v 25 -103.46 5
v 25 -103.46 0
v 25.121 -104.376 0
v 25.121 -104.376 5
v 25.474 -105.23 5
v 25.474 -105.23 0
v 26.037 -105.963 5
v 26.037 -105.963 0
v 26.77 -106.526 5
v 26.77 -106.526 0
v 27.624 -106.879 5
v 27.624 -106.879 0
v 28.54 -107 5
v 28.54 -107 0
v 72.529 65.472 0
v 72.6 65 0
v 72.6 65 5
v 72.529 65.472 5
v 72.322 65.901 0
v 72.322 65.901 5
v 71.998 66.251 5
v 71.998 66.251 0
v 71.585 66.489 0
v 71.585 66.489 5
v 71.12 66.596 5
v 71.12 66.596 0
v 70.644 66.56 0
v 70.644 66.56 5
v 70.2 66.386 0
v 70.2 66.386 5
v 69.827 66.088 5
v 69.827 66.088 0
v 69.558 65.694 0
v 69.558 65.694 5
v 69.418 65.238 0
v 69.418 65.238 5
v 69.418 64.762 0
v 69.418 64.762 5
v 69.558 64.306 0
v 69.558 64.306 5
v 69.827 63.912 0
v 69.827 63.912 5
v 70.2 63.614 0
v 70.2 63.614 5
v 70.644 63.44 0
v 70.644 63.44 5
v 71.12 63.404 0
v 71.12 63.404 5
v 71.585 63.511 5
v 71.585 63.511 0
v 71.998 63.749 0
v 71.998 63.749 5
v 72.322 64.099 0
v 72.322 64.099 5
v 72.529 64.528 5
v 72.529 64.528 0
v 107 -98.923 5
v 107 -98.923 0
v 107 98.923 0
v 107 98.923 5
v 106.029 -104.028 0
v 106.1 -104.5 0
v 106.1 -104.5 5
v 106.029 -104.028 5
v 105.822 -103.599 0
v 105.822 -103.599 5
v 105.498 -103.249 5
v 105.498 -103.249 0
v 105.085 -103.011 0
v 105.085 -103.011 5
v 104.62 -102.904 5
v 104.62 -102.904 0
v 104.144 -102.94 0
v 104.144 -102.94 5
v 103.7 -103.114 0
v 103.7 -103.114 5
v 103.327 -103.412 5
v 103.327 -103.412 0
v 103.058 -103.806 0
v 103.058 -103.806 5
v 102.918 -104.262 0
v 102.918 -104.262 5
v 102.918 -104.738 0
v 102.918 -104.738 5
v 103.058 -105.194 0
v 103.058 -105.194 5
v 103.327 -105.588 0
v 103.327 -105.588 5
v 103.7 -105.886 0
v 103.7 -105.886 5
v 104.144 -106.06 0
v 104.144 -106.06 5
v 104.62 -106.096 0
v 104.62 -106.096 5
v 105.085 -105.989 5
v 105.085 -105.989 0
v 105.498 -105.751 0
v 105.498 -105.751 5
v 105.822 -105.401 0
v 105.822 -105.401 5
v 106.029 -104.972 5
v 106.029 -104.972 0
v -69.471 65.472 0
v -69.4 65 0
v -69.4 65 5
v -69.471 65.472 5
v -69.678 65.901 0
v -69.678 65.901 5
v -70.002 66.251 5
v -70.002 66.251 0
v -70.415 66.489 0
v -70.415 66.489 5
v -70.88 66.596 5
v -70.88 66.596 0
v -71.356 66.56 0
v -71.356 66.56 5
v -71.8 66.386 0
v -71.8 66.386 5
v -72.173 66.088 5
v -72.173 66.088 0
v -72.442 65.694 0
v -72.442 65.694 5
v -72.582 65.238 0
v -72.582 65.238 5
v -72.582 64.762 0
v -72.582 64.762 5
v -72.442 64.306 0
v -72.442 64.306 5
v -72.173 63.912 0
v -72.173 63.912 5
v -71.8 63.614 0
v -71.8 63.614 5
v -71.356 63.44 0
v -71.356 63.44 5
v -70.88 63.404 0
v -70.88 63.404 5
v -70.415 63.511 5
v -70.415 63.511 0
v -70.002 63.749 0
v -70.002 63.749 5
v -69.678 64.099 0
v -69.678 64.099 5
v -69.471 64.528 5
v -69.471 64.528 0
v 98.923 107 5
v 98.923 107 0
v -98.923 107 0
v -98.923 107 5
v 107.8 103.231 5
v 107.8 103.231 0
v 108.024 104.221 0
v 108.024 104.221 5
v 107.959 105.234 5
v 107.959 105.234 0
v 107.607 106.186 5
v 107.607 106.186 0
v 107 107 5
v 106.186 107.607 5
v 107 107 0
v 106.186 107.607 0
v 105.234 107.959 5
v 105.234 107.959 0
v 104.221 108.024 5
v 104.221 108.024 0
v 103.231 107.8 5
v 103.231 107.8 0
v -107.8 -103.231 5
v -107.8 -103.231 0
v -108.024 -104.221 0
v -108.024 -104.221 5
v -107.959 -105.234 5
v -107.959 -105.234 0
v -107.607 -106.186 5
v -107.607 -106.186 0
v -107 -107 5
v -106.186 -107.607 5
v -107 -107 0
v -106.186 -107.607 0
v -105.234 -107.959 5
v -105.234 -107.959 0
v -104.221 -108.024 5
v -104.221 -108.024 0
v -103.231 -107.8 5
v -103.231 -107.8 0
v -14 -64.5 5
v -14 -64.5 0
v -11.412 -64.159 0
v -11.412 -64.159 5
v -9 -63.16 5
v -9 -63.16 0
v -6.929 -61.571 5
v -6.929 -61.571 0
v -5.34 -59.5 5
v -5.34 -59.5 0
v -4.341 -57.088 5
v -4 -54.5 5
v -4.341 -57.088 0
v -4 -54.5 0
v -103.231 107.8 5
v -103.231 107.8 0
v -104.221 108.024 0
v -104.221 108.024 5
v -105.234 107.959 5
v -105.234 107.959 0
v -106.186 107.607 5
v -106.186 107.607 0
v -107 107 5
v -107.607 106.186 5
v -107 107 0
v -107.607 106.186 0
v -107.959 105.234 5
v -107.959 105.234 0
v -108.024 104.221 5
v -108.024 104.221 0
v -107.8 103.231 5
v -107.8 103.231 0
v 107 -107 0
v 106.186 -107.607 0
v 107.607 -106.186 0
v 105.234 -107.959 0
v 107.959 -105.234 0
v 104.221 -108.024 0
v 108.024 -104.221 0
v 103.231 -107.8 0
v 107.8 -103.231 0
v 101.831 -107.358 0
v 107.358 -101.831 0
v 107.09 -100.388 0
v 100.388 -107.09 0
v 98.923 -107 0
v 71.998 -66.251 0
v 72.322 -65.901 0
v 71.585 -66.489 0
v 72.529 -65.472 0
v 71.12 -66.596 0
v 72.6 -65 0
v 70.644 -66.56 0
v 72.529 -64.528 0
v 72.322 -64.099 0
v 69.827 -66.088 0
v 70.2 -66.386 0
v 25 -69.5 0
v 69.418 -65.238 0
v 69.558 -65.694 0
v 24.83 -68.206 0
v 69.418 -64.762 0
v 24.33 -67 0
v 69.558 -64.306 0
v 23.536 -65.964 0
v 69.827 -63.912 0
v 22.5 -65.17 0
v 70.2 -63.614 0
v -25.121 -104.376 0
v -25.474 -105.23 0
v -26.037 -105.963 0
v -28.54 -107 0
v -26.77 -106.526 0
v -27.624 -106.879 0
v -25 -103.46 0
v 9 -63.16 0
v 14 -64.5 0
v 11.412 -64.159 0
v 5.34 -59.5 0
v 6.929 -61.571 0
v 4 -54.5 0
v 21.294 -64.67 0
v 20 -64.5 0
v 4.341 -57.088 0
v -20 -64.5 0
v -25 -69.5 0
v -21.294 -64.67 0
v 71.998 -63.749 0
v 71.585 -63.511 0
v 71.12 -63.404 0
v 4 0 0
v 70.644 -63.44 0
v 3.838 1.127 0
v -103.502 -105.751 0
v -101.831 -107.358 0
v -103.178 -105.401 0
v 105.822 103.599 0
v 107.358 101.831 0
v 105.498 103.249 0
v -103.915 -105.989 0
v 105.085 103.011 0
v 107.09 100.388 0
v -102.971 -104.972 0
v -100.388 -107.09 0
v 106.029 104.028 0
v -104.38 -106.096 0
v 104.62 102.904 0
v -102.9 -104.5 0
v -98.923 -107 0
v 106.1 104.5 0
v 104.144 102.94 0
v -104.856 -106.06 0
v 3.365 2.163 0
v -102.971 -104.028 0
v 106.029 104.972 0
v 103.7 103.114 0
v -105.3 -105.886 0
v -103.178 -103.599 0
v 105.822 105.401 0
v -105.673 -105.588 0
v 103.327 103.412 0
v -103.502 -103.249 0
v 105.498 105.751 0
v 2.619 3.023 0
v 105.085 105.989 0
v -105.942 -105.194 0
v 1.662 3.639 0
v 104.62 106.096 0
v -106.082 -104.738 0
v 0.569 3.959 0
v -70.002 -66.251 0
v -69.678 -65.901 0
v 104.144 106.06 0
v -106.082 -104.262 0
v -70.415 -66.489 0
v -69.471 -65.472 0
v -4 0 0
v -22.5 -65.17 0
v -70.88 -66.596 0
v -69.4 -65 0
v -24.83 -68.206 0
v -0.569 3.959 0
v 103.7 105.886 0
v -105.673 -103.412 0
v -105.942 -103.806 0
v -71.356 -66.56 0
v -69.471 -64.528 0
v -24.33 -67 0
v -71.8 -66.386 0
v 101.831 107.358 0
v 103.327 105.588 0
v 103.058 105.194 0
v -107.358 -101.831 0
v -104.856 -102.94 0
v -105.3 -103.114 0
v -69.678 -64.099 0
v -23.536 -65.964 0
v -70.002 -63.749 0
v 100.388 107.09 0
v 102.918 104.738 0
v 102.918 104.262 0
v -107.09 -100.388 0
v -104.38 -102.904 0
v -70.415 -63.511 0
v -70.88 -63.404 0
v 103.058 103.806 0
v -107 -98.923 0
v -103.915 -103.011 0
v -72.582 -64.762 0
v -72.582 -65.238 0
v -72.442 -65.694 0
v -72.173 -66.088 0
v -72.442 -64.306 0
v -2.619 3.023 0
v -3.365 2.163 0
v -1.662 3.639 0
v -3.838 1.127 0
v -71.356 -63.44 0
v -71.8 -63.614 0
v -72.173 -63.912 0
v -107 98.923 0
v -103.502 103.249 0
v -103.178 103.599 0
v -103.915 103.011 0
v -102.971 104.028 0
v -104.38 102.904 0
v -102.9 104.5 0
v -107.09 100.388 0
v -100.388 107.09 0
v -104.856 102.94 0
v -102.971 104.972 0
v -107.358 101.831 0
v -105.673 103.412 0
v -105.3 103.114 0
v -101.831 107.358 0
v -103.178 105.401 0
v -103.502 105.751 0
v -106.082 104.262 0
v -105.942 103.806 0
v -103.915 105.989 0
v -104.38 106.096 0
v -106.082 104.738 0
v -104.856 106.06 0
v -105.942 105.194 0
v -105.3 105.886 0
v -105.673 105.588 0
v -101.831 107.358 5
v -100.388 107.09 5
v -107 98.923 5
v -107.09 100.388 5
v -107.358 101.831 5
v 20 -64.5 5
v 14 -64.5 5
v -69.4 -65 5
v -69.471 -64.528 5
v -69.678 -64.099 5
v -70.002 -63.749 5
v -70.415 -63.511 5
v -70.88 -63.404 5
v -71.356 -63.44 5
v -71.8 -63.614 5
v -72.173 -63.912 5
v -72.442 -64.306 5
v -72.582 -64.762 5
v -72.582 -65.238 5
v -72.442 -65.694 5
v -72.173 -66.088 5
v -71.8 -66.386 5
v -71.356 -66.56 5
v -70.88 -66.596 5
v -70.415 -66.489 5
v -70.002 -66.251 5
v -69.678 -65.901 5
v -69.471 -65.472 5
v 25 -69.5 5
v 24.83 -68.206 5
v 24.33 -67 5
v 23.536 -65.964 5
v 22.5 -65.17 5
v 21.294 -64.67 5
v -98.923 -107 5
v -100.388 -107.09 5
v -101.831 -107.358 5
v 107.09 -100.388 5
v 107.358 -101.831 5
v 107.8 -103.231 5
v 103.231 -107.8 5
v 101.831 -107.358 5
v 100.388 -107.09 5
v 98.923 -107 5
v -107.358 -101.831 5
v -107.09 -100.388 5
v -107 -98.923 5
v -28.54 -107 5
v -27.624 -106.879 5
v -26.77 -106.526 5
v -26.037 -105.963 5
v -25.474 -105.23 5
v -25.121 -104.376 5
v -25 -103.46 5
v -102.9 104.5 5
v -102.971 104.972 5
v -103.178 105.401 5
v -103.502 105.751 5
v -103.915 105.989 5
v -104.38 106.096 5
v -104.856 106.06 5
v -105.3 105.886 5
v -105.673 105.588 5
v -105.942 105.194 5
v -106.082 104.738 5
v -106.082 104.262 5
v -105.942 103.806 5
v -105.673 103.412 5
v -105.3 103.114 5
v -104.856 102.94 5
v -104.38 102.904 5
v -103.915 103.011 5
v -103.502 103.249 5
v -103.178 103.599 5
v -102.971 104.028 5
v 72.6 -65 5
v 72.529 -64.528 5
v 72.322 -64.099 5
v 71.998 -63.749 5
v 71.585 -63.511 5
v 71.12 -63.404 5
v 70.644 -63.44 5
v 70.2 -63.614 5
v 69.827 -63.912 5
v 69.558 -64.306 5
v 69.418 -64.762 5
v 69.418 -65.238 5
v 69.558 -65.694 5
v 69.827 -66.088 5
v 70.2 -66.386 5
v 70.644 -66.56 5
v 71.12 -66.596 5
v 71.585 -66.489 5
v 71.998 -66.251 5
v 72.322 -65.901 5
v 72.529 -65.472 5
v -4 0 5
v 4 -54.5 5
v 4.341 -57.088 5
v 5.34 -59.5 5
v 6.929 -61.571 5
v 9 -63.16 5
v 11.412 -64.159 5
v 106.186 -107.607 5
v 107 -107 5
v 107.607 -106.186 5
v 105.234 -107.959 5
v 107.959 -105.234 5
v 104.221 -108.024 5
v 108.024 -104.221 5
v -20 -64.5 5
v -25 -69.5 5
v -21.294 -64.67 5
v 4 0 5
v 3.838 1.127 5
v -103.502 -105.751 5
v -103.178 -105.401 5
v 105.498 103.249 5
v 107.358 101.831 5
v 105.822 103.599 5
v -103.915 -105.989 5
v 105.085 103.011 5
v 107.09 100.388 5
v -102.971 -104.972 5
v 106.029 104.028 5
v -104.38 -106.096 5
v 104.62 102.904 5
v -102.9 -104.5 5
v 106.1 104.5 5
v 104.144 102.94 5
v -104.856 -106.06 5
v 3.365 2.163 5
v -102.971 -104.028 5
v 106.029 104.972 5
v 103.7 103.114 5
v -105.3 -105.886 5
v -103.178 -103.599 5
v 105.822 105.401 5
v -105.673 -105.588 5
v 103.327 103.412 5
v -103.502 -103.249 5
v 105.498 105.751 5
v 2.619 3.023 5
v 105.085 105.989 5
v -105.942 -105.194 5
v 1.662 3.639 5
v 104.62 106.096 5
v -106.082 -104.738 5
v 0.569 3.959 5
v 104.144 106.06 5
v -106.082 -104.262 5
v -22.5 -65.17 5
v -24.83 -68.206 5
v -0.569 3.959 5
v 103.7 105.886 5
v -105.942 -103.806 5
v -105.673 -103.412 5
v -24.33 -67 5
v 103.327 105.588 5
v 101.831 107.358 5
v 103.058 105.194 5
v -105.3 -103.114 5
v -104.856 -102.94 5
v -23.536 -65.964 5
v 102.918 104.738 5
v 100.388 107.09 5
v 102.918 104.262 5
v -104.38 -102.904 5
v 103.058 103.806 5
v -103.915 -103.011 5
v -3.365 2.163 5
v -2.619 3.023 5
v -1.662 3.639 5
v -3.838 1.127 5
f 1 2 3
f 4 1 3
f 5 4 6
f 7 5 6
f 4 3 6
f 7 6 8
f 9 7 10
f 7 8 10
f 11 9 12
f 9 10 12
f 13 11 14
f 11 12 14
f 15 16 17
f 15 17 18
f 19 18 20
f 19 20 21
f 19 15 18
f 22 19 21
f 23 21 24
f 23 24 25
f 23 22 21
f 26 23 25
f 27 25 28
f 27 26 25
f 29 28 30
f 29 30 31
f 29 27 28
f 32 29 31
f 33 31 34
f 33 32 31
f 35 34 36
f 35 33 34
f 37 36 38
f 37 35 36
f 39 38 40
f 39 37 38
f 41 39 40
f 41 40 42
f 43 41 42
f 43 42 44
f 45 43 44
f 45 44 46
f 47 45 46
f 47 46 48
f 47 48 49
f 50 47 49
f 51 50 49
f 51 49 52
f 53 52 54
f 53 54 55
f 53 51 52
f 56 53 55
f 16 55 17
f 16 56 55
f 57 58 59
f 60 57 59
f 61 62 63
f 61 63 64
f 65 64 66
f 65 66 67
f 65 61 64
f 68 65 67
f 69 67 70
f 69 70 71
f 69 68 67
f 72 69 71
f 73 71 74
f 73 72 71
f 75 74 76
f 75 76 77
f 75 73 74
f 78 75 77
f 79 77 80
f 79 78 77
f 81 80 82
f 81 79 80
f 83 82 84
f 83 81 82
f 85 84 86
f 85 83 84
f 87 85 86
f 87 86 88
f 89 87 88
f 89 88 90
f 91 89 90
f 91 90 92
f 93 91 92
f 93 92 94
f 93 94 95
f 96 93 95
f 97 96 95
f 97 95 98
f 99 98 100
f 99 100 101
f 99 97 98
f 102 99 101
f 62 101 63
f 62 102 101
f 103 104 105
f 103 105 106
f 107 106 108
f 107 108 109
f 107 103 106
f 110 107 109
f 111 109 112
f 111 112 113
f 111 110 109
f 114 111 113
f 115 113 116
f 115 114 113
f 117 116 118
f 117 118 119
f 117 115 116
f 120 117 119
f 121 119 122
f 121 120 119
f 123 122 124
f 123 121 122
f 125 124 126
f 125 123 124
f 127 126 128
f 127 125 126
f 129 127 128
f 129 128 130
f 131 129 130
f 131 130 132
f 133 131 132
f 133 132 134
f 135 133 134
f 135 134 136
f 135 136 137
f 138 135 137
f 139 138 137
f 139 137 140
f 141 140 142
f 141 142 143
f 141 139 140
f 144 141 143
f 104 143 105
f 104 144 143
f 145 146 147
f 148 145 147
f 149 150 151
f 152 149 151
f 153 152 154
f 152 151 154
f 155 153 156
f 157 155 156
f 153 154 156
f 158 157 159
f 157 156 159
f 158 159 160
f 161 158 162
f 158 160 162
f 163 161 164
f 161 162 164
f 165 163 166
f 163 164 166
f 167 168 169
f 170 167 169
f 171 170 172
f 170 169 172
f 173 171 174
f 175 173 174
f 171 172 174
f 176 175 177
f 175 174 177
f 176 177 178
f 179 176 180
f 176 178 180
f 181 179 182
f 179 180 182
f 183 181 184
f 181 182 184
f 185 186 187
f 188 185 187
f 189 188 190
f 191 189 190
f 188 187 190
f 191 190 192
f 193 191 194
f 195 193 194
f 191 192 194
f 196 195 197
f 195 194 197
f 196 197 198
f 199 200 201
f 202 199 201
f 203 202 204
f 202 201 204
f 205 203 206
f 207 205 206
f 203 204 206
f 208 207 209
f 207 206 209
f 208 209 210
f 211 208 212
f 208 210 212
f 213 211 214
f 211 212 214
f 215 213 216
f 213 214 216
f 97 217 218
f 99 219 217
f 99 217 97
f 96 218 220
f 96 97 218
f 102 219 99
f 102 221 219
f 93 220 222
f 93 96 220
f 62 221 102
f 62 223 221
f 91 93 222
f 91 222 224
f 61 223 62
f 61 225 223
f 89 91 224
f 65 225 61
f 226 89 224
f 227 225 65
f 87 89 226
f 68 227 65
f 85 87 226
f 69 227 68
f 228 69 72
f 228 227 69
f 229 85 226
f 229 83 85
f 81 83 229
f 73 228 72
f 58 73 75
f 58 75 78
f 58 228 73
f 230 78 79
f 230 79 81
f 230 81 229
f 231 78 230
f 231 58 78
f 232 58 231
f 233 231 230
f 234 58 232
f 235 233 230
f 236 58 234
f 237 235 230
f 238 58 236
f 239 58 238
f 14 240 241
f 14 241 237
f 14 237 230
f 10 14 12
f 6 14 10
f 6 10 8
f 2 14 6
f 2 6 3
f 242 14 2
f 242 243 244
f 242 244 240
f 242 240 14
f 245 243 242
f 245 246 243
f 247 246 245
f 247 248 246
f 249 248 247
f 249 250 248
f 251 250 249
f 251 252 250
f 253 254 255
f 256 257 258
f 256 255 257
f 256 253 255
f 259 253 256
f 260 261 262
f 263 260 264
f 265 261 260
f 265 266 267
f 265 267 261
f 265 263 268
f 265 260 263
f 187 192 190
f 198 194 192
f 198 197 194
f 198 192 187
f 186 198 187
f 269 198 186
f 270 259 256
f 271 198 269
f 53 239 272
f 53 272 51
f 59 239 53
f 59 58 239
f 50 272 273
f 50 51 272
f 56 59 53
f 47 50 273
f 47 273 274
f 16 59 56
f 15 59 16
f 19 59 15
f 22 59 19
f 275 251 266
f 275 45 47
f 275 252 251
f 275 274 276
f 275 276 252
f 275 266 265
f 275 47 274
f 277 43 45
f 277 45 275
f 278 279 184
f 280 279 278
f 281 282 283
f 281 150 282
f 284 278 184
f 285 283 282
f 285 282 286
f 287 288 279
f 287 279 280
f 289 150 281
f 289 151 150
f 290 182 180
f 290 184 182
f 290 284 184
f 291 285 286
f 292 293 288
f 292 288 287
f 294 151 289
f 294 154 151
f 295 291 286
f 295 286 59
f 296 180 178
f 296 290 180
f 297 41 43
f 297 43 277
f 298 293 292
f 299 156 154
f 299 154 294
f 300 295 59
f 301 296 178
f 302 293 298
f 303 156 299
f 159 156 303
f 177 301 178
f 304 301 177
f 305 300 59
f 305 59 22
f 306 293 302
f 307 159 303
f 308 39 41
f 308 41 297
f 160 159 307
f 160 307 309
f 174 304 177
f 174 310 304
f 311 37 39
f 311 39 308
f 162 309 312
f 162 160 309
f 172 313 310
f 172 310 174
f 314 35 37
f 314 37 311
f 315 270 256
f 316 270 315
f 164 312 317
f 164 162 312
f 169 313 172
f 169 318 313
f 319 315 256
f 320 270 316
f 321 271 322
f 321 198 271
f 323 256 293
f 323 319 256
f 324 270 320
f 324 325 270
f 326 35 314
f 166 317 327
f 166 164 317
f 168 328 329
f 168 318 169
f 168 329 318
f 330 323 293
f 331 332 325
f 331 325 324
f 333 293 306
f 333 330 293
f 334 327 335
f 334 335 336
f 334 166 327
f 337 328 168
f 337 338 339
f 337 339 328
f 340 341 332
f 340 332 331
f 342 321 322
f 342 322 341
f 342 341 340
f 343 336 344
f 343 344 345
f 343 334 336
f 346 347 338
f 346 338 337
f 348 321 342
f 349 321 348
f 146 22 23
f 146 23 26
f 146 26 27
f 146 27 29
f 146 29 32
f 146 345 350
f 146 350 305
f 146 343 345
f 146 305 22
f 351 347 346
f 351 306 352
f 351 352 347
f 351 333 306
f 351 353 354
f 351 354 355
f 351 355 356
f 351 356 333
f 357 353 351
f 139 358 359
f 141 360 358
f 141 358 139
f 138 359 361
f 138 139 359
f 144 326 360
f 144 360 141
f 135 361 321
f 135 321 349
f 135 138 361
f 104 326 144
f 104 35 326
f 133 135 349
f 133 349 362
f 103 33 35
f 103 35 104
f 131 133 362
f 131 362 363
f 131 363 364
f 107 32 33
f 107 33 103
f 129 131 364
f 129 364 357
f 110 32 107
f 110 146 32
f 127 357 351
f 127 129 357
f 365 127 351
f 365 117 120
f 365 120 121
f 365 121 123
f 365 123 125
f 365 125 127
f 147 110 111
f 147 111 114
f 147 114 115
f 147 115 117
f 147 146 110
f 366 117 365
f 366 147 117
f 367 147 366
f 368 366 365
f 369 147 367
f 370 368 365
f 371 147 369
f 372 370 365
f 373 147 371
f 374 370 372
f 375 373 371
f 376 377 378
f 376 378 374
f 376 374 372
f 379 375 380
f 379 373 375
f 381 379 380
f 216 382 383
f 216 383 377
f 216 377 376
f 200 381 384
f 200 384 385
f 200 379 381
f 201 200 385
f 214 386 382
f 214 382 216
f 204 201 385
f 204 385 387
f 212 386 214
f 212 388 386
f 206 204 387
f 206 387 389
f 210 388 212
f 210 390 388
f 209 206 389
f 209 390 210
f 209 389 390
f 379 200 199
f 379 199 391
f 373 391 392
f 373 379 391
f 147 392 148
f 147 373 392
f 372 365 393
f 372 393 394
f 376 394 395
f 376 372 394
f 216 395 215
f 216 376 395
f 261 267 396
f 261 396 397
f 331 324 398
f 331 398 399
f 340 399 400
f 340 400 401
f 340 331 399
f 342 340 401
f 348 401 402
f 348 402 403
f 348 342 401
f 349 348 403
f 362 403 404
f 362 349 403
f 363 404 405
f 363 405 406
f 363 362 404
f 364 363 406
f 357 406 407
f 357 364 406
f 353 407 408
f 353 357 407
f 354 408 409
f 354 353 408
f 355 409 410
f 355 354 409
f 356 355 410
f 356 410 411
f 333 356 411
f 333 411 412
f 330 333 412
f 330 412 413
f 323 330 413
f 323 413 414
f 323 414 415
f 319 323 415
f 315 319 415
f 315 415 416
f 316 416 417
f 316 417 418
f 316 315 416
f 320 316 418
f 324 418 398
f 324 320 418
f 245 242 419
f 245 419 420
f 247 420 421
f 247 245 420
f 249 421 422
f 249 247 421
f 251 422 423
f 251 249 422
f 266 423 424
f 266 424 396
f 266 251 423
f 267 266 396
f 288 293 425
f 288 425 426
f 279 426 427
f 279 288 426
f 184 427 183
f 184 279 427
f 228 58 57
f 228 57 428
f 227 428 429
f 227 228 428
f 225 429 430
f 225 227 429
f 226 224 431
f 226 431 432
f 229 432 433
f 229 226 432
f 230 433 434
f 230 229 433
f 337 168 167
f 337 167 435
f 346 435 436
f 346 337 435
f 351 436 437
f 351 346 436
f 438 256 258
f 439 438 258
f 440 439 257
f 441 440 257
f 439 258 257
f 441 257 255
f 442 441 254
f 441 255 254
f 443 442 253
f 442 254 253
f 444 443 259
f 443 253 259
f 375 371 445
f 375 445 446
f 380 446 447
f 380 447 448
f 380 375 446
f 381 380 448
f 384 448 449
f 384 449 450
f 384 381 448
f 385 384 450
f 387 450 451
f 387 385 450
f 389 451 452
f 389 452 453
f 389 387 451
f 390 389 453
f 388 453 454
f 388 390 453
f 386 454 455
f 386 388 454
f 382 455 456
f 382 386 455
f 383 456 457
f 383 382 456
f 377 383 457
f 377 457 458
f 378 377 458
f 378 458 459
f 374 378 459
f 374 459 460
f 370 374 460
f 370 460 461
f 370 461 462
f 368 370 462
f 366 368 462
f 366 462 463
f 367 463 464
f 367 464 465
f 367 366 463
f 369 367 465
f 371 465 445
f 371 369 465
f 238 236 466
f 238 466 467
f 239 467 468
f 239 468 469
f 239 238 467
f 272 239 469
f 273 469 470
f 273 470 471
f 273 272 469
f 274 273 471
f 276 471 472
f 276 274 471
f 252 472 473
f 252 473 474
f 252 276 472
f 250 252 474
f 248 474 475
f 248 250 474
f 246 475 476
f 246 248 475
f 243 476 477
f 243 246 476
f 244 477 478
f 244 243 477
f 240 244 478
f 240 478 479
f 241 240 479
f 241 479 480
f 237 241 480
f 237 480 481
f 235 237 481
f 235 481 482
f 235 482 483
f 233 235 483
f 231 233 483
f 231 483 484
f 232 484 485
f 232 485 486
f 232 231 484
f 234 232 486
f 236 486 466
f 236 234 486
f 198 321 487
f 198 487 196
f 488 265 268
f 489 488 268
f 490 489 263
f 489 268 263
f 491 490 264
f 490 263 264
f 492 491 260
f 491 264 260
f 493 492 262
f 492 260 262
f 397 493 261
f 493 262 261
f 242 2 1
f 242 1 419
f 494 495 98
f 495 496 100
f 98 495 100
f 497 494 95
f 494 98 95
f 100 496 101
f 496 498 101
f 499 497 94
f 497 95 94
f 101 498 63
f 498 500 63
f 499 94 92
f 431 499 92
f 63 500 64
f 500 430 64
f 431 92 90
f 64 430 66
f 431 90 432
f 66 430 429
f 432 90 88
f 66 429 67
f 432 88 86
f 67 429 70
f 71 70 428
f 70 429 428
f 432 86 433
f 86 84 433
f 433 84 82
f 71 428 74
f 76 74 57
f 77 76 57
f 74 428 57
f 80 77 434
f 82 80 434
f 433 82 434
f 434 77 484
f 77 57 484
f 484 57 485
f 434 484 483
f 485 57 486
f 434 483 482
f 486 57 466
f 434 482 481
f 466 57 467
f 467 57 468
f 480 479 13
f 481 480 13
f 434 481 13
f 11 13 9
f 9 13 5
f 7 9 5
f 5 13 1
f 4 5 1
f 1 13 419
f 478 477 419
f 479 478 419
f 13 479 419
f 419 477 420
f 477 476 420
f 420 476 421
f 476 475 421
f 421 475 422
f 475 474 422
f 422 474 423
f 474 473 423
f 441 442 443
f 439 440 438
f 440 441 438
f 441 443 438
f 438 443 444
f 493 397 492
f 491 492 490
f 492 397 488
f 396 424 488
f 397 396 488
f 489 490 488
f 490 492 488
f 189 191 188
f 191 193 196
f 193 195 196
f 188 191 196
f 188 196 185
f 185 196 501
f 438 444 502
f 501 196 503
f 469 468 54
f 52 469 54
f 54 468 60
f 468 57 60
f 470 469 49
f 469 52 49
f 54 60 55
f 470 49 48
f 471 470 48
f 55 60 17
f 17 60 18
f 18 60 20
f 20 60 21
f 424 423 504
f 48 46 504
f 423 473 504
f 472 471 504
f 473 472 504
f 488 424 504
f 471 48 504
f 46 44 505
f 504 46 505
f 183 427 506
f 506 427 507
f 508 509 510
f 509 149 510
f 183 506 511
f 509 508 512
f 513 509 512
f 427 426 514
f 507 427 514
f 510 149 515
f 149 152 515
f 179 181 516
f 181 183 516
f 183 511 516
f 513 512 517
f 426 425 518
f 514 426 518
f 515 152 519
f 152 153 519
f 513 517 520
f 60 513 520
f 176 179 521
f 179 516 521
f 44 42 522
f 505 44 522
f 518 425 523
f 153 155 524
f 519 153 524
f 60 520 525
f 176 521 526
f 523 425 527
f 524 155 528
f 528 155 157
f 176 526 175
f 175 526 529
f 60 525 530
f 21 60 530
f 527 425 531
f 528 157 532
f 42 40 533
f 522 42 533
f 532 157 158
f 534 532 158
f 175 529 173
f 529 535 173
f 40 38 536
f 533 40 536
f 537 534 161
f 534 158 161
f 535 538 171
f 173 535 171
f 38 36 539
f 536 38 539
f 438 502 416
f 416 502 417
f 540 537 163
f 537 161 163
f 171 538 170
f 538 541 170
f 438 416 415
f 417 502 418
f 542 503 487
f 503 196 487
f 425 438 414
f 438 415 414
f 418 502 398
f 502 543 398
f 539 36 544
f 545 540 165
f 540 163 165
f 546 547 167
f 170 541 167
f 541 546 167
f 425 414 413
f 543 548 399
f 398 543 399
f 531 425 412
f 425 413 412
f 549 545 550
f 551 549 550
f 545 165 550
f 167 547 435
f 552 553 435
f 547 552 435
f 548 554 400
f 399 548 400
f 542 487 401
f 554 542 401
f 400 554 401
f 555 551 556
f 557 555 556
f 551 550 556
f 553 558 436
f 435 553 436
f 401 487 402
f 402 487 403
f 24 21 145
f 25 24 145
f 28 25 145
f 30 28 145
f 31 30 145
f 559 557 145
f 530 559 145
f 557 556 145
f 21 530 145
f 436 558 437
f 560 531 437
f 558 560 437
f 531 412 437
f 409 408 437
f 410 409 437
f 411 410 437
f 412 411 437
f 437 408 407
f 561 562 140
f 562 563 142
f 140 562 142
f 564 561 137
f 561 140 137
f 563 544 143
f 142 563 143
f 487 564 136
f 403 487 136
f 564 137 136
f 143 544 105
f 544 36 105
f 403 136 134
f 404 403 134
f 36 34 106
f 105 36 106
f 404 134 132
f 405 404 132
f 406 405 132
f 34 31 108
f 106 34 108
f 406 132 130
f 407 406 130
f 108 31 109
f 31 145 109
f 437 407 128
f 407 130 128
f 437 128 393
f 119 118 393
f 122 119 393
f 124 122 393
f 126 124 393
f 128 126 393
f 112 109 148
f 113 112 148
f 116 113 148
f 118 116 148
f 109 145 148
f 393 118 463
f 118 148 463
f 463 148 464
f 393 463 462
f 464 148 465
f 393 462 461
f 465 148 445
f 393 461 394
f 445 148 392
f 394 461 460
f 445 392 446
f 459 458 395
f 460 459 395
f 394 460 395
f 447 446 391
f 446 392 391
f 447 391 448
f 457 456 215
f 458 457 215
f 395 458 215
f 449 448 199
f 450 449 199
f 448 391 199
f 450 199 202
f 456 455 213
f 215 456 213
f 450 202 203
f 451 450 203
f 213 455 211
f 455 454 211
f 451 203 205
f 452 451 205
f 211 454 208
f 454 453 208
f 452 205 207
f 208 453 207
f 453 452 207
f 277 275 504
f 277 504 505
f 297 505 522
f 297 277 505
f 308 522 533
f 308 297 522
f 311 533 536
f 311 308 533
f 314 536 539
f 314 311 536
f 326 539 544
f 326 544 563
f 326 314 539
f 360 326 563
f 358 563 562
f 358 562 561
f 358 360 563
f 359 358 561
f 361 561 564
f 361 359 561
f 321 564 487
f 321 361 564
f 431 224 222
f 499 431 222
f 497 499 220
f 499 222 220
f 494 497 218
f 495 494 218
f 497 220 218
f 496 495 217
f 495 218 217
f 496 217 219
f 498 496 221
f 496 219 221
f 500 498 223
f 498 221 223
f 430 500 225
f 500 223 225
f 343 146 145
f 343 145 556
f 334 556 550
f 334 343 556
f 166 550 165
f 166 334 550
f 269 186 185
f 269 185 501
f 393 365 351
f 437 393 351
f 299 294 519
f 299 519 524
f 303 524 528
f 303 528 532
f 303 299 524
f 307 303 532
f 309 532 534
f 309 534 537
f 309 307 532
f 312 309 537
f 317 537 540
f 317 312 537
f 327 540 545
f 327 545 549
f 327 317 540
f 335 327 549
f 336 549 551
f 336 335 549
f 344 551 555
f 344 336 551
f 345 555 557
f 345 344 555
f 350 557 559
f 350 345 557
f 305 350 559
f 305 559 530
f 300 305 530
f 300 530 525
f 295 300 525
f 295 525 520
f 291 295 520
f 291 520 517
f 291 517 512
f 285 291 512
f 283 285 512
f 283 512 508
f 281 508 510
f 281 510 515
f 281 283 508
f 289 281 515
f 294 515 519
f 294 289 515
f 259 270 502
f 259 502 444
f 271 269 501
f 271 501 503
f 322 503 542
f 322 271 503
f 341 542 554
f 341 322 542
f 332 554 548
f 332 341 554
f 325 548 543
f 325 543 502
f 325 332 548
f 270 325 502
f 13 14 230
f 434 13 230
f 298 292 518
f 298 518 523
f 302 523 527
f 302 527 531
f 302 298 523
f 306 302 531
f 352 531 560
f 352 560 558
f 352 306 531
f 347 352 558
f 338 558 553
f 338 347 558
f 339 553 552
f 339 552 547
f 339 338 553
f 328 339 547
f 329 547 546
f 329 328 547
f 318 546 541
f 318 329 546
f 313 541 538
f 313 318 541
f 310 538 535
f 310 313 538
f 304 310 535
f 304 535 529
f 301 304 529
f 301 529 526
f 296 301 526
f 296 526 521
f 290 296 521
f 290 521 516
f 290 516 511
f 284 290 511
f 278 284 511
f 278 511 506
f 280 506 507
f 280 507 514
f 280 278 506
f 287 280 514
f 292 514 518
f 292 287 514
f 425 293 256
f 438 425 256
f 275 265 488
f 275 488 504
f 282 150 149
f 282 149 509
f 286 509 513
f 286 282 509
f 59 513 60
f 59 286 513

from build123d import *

# Parameters (mm, degrees)
SKETCH038_R = 1.6
PAD_DEPTH   = 5


with BuildPart() as part:
    # Sketch038 → Pad (new body)
    with BuildSketch(Plane.XY):
        with BuildLine():
            ThreePointArc((4, 0), (0, 4), (-4, 0))
            Line((-4, 0), (-4, -54.5))
            ThreePointArc((-14, -64.5), (-6.928932, -61.571068), (-4, -54.5))
            Line((-14, -64.5), (-20, -64.5))
            ThreePointArc((-20, -64.5), (-23.535534, -65.964466), (-25, -69.5))
            Line((-25, -69.5), (-25, -103.46))
            ThreePointArc((-28.54, -107), (-26.036842, -105.963158), (-25, -103.46))
            Line((-98.92301, -107), (-28.54, -107))
            ThreePointArc((-98.92301, -107), (-101.113722, -107.201662), (-103.230804, -107.79987))
            ThreePointArc((-107.79987, -103.230804), (-107, -107), (-103.230804, -107.79987))
            ThreePointArc((-107.79987, -103.230804), (-107.201662, -101.113722), (-107, -98.92301))
            Line((-107, 98.92301), (-107, -98.92301))
            ThreePointArc((-107, 98.92301), (-107.201662, 101.113722), (-107.79987, 103.230804))
            ThreePointArc((-103.230804, 107.79987), (-107, 107), (-107.79987, 103.230804))
            ThreePointArc((-103.230804, 107.79987), (-101.113722, 107.201662), (-98.92301, 107))
            Line((98.92301, 107), (-98.92301, 107))
            ThreePointArc((98.92301, 107), (101.113722, 107.201662), (103.230804, 107.79987))
            ThreePointArc((107.79987, 103.230804), (107, 107), (103.230804, 107.79987))
            ThreePointArc((107.79987, 103.230804), (107.201662, 101.113722), (107, 98.92301))
            Line((107, -98.92301), (107, 98.92301))
            ThreePointArc((107, -98.92301), (107.201662, -101.113722), (107.79987, -103.230804))
            ThreePointArc((103.230804, -107.79987), (107, -107), (107.79987, -103.230804))
            ThreePointArc((103.230804, -107.79987), (101.113722, -107.201662), (98.92301, -107))
            Line((28.54, -107), (98.92301, -107))
            ThreePointArc((25, -103.46), (26.036842, -105.963158), (28.54, -107))
            Line((25, -103.46), (25, -69.5))
            ThreePointArc((25, -69.5), (23.535534, -65.964466), (20, -64.5))
            Line((20, -64.5), (14, -64.5))
            ThreePointArc((4, -54.5), (6.928932, -61.571068), (14, -64.5))
            Line((4, -54.5), (4, 0))
        make_face()
        with Locations((104.5, -104.5)):
            Circle(SKETCH038_R, mode=Mode.SUBTRACT)
        with Locations((104.5, 104.5)):
            Circle(SKETCH038_R, mode=Mode.SUBTRACT)
        with Locations((-104.5, -104.5)):
            Circle(SKETCH038_R, mode=Mode.SUBTRACT)
        with Locations((71, -65)):
            Circle(SKETCH038_R, mode=Mode.SUBTRACT)
        with Locations((71, 65)):
            Circle(SKETCH038_R, mode=Mode.SUBTRACT)
        with Locations((-104.5, 104.5)):
            Circle(SKETCH038_R, mode=Mode.SUBTRACT)
        with Locations((-71, -65)):
            Circle(SKETCH038_R, mode=Mode.SUBTRACT)
        with Locations((-71, 65)):
            Circle(SKETCH038_R, mode=Mode.SUBTRACT)
    extrude(amount=PAD_DEPTH)


solid = part.part
